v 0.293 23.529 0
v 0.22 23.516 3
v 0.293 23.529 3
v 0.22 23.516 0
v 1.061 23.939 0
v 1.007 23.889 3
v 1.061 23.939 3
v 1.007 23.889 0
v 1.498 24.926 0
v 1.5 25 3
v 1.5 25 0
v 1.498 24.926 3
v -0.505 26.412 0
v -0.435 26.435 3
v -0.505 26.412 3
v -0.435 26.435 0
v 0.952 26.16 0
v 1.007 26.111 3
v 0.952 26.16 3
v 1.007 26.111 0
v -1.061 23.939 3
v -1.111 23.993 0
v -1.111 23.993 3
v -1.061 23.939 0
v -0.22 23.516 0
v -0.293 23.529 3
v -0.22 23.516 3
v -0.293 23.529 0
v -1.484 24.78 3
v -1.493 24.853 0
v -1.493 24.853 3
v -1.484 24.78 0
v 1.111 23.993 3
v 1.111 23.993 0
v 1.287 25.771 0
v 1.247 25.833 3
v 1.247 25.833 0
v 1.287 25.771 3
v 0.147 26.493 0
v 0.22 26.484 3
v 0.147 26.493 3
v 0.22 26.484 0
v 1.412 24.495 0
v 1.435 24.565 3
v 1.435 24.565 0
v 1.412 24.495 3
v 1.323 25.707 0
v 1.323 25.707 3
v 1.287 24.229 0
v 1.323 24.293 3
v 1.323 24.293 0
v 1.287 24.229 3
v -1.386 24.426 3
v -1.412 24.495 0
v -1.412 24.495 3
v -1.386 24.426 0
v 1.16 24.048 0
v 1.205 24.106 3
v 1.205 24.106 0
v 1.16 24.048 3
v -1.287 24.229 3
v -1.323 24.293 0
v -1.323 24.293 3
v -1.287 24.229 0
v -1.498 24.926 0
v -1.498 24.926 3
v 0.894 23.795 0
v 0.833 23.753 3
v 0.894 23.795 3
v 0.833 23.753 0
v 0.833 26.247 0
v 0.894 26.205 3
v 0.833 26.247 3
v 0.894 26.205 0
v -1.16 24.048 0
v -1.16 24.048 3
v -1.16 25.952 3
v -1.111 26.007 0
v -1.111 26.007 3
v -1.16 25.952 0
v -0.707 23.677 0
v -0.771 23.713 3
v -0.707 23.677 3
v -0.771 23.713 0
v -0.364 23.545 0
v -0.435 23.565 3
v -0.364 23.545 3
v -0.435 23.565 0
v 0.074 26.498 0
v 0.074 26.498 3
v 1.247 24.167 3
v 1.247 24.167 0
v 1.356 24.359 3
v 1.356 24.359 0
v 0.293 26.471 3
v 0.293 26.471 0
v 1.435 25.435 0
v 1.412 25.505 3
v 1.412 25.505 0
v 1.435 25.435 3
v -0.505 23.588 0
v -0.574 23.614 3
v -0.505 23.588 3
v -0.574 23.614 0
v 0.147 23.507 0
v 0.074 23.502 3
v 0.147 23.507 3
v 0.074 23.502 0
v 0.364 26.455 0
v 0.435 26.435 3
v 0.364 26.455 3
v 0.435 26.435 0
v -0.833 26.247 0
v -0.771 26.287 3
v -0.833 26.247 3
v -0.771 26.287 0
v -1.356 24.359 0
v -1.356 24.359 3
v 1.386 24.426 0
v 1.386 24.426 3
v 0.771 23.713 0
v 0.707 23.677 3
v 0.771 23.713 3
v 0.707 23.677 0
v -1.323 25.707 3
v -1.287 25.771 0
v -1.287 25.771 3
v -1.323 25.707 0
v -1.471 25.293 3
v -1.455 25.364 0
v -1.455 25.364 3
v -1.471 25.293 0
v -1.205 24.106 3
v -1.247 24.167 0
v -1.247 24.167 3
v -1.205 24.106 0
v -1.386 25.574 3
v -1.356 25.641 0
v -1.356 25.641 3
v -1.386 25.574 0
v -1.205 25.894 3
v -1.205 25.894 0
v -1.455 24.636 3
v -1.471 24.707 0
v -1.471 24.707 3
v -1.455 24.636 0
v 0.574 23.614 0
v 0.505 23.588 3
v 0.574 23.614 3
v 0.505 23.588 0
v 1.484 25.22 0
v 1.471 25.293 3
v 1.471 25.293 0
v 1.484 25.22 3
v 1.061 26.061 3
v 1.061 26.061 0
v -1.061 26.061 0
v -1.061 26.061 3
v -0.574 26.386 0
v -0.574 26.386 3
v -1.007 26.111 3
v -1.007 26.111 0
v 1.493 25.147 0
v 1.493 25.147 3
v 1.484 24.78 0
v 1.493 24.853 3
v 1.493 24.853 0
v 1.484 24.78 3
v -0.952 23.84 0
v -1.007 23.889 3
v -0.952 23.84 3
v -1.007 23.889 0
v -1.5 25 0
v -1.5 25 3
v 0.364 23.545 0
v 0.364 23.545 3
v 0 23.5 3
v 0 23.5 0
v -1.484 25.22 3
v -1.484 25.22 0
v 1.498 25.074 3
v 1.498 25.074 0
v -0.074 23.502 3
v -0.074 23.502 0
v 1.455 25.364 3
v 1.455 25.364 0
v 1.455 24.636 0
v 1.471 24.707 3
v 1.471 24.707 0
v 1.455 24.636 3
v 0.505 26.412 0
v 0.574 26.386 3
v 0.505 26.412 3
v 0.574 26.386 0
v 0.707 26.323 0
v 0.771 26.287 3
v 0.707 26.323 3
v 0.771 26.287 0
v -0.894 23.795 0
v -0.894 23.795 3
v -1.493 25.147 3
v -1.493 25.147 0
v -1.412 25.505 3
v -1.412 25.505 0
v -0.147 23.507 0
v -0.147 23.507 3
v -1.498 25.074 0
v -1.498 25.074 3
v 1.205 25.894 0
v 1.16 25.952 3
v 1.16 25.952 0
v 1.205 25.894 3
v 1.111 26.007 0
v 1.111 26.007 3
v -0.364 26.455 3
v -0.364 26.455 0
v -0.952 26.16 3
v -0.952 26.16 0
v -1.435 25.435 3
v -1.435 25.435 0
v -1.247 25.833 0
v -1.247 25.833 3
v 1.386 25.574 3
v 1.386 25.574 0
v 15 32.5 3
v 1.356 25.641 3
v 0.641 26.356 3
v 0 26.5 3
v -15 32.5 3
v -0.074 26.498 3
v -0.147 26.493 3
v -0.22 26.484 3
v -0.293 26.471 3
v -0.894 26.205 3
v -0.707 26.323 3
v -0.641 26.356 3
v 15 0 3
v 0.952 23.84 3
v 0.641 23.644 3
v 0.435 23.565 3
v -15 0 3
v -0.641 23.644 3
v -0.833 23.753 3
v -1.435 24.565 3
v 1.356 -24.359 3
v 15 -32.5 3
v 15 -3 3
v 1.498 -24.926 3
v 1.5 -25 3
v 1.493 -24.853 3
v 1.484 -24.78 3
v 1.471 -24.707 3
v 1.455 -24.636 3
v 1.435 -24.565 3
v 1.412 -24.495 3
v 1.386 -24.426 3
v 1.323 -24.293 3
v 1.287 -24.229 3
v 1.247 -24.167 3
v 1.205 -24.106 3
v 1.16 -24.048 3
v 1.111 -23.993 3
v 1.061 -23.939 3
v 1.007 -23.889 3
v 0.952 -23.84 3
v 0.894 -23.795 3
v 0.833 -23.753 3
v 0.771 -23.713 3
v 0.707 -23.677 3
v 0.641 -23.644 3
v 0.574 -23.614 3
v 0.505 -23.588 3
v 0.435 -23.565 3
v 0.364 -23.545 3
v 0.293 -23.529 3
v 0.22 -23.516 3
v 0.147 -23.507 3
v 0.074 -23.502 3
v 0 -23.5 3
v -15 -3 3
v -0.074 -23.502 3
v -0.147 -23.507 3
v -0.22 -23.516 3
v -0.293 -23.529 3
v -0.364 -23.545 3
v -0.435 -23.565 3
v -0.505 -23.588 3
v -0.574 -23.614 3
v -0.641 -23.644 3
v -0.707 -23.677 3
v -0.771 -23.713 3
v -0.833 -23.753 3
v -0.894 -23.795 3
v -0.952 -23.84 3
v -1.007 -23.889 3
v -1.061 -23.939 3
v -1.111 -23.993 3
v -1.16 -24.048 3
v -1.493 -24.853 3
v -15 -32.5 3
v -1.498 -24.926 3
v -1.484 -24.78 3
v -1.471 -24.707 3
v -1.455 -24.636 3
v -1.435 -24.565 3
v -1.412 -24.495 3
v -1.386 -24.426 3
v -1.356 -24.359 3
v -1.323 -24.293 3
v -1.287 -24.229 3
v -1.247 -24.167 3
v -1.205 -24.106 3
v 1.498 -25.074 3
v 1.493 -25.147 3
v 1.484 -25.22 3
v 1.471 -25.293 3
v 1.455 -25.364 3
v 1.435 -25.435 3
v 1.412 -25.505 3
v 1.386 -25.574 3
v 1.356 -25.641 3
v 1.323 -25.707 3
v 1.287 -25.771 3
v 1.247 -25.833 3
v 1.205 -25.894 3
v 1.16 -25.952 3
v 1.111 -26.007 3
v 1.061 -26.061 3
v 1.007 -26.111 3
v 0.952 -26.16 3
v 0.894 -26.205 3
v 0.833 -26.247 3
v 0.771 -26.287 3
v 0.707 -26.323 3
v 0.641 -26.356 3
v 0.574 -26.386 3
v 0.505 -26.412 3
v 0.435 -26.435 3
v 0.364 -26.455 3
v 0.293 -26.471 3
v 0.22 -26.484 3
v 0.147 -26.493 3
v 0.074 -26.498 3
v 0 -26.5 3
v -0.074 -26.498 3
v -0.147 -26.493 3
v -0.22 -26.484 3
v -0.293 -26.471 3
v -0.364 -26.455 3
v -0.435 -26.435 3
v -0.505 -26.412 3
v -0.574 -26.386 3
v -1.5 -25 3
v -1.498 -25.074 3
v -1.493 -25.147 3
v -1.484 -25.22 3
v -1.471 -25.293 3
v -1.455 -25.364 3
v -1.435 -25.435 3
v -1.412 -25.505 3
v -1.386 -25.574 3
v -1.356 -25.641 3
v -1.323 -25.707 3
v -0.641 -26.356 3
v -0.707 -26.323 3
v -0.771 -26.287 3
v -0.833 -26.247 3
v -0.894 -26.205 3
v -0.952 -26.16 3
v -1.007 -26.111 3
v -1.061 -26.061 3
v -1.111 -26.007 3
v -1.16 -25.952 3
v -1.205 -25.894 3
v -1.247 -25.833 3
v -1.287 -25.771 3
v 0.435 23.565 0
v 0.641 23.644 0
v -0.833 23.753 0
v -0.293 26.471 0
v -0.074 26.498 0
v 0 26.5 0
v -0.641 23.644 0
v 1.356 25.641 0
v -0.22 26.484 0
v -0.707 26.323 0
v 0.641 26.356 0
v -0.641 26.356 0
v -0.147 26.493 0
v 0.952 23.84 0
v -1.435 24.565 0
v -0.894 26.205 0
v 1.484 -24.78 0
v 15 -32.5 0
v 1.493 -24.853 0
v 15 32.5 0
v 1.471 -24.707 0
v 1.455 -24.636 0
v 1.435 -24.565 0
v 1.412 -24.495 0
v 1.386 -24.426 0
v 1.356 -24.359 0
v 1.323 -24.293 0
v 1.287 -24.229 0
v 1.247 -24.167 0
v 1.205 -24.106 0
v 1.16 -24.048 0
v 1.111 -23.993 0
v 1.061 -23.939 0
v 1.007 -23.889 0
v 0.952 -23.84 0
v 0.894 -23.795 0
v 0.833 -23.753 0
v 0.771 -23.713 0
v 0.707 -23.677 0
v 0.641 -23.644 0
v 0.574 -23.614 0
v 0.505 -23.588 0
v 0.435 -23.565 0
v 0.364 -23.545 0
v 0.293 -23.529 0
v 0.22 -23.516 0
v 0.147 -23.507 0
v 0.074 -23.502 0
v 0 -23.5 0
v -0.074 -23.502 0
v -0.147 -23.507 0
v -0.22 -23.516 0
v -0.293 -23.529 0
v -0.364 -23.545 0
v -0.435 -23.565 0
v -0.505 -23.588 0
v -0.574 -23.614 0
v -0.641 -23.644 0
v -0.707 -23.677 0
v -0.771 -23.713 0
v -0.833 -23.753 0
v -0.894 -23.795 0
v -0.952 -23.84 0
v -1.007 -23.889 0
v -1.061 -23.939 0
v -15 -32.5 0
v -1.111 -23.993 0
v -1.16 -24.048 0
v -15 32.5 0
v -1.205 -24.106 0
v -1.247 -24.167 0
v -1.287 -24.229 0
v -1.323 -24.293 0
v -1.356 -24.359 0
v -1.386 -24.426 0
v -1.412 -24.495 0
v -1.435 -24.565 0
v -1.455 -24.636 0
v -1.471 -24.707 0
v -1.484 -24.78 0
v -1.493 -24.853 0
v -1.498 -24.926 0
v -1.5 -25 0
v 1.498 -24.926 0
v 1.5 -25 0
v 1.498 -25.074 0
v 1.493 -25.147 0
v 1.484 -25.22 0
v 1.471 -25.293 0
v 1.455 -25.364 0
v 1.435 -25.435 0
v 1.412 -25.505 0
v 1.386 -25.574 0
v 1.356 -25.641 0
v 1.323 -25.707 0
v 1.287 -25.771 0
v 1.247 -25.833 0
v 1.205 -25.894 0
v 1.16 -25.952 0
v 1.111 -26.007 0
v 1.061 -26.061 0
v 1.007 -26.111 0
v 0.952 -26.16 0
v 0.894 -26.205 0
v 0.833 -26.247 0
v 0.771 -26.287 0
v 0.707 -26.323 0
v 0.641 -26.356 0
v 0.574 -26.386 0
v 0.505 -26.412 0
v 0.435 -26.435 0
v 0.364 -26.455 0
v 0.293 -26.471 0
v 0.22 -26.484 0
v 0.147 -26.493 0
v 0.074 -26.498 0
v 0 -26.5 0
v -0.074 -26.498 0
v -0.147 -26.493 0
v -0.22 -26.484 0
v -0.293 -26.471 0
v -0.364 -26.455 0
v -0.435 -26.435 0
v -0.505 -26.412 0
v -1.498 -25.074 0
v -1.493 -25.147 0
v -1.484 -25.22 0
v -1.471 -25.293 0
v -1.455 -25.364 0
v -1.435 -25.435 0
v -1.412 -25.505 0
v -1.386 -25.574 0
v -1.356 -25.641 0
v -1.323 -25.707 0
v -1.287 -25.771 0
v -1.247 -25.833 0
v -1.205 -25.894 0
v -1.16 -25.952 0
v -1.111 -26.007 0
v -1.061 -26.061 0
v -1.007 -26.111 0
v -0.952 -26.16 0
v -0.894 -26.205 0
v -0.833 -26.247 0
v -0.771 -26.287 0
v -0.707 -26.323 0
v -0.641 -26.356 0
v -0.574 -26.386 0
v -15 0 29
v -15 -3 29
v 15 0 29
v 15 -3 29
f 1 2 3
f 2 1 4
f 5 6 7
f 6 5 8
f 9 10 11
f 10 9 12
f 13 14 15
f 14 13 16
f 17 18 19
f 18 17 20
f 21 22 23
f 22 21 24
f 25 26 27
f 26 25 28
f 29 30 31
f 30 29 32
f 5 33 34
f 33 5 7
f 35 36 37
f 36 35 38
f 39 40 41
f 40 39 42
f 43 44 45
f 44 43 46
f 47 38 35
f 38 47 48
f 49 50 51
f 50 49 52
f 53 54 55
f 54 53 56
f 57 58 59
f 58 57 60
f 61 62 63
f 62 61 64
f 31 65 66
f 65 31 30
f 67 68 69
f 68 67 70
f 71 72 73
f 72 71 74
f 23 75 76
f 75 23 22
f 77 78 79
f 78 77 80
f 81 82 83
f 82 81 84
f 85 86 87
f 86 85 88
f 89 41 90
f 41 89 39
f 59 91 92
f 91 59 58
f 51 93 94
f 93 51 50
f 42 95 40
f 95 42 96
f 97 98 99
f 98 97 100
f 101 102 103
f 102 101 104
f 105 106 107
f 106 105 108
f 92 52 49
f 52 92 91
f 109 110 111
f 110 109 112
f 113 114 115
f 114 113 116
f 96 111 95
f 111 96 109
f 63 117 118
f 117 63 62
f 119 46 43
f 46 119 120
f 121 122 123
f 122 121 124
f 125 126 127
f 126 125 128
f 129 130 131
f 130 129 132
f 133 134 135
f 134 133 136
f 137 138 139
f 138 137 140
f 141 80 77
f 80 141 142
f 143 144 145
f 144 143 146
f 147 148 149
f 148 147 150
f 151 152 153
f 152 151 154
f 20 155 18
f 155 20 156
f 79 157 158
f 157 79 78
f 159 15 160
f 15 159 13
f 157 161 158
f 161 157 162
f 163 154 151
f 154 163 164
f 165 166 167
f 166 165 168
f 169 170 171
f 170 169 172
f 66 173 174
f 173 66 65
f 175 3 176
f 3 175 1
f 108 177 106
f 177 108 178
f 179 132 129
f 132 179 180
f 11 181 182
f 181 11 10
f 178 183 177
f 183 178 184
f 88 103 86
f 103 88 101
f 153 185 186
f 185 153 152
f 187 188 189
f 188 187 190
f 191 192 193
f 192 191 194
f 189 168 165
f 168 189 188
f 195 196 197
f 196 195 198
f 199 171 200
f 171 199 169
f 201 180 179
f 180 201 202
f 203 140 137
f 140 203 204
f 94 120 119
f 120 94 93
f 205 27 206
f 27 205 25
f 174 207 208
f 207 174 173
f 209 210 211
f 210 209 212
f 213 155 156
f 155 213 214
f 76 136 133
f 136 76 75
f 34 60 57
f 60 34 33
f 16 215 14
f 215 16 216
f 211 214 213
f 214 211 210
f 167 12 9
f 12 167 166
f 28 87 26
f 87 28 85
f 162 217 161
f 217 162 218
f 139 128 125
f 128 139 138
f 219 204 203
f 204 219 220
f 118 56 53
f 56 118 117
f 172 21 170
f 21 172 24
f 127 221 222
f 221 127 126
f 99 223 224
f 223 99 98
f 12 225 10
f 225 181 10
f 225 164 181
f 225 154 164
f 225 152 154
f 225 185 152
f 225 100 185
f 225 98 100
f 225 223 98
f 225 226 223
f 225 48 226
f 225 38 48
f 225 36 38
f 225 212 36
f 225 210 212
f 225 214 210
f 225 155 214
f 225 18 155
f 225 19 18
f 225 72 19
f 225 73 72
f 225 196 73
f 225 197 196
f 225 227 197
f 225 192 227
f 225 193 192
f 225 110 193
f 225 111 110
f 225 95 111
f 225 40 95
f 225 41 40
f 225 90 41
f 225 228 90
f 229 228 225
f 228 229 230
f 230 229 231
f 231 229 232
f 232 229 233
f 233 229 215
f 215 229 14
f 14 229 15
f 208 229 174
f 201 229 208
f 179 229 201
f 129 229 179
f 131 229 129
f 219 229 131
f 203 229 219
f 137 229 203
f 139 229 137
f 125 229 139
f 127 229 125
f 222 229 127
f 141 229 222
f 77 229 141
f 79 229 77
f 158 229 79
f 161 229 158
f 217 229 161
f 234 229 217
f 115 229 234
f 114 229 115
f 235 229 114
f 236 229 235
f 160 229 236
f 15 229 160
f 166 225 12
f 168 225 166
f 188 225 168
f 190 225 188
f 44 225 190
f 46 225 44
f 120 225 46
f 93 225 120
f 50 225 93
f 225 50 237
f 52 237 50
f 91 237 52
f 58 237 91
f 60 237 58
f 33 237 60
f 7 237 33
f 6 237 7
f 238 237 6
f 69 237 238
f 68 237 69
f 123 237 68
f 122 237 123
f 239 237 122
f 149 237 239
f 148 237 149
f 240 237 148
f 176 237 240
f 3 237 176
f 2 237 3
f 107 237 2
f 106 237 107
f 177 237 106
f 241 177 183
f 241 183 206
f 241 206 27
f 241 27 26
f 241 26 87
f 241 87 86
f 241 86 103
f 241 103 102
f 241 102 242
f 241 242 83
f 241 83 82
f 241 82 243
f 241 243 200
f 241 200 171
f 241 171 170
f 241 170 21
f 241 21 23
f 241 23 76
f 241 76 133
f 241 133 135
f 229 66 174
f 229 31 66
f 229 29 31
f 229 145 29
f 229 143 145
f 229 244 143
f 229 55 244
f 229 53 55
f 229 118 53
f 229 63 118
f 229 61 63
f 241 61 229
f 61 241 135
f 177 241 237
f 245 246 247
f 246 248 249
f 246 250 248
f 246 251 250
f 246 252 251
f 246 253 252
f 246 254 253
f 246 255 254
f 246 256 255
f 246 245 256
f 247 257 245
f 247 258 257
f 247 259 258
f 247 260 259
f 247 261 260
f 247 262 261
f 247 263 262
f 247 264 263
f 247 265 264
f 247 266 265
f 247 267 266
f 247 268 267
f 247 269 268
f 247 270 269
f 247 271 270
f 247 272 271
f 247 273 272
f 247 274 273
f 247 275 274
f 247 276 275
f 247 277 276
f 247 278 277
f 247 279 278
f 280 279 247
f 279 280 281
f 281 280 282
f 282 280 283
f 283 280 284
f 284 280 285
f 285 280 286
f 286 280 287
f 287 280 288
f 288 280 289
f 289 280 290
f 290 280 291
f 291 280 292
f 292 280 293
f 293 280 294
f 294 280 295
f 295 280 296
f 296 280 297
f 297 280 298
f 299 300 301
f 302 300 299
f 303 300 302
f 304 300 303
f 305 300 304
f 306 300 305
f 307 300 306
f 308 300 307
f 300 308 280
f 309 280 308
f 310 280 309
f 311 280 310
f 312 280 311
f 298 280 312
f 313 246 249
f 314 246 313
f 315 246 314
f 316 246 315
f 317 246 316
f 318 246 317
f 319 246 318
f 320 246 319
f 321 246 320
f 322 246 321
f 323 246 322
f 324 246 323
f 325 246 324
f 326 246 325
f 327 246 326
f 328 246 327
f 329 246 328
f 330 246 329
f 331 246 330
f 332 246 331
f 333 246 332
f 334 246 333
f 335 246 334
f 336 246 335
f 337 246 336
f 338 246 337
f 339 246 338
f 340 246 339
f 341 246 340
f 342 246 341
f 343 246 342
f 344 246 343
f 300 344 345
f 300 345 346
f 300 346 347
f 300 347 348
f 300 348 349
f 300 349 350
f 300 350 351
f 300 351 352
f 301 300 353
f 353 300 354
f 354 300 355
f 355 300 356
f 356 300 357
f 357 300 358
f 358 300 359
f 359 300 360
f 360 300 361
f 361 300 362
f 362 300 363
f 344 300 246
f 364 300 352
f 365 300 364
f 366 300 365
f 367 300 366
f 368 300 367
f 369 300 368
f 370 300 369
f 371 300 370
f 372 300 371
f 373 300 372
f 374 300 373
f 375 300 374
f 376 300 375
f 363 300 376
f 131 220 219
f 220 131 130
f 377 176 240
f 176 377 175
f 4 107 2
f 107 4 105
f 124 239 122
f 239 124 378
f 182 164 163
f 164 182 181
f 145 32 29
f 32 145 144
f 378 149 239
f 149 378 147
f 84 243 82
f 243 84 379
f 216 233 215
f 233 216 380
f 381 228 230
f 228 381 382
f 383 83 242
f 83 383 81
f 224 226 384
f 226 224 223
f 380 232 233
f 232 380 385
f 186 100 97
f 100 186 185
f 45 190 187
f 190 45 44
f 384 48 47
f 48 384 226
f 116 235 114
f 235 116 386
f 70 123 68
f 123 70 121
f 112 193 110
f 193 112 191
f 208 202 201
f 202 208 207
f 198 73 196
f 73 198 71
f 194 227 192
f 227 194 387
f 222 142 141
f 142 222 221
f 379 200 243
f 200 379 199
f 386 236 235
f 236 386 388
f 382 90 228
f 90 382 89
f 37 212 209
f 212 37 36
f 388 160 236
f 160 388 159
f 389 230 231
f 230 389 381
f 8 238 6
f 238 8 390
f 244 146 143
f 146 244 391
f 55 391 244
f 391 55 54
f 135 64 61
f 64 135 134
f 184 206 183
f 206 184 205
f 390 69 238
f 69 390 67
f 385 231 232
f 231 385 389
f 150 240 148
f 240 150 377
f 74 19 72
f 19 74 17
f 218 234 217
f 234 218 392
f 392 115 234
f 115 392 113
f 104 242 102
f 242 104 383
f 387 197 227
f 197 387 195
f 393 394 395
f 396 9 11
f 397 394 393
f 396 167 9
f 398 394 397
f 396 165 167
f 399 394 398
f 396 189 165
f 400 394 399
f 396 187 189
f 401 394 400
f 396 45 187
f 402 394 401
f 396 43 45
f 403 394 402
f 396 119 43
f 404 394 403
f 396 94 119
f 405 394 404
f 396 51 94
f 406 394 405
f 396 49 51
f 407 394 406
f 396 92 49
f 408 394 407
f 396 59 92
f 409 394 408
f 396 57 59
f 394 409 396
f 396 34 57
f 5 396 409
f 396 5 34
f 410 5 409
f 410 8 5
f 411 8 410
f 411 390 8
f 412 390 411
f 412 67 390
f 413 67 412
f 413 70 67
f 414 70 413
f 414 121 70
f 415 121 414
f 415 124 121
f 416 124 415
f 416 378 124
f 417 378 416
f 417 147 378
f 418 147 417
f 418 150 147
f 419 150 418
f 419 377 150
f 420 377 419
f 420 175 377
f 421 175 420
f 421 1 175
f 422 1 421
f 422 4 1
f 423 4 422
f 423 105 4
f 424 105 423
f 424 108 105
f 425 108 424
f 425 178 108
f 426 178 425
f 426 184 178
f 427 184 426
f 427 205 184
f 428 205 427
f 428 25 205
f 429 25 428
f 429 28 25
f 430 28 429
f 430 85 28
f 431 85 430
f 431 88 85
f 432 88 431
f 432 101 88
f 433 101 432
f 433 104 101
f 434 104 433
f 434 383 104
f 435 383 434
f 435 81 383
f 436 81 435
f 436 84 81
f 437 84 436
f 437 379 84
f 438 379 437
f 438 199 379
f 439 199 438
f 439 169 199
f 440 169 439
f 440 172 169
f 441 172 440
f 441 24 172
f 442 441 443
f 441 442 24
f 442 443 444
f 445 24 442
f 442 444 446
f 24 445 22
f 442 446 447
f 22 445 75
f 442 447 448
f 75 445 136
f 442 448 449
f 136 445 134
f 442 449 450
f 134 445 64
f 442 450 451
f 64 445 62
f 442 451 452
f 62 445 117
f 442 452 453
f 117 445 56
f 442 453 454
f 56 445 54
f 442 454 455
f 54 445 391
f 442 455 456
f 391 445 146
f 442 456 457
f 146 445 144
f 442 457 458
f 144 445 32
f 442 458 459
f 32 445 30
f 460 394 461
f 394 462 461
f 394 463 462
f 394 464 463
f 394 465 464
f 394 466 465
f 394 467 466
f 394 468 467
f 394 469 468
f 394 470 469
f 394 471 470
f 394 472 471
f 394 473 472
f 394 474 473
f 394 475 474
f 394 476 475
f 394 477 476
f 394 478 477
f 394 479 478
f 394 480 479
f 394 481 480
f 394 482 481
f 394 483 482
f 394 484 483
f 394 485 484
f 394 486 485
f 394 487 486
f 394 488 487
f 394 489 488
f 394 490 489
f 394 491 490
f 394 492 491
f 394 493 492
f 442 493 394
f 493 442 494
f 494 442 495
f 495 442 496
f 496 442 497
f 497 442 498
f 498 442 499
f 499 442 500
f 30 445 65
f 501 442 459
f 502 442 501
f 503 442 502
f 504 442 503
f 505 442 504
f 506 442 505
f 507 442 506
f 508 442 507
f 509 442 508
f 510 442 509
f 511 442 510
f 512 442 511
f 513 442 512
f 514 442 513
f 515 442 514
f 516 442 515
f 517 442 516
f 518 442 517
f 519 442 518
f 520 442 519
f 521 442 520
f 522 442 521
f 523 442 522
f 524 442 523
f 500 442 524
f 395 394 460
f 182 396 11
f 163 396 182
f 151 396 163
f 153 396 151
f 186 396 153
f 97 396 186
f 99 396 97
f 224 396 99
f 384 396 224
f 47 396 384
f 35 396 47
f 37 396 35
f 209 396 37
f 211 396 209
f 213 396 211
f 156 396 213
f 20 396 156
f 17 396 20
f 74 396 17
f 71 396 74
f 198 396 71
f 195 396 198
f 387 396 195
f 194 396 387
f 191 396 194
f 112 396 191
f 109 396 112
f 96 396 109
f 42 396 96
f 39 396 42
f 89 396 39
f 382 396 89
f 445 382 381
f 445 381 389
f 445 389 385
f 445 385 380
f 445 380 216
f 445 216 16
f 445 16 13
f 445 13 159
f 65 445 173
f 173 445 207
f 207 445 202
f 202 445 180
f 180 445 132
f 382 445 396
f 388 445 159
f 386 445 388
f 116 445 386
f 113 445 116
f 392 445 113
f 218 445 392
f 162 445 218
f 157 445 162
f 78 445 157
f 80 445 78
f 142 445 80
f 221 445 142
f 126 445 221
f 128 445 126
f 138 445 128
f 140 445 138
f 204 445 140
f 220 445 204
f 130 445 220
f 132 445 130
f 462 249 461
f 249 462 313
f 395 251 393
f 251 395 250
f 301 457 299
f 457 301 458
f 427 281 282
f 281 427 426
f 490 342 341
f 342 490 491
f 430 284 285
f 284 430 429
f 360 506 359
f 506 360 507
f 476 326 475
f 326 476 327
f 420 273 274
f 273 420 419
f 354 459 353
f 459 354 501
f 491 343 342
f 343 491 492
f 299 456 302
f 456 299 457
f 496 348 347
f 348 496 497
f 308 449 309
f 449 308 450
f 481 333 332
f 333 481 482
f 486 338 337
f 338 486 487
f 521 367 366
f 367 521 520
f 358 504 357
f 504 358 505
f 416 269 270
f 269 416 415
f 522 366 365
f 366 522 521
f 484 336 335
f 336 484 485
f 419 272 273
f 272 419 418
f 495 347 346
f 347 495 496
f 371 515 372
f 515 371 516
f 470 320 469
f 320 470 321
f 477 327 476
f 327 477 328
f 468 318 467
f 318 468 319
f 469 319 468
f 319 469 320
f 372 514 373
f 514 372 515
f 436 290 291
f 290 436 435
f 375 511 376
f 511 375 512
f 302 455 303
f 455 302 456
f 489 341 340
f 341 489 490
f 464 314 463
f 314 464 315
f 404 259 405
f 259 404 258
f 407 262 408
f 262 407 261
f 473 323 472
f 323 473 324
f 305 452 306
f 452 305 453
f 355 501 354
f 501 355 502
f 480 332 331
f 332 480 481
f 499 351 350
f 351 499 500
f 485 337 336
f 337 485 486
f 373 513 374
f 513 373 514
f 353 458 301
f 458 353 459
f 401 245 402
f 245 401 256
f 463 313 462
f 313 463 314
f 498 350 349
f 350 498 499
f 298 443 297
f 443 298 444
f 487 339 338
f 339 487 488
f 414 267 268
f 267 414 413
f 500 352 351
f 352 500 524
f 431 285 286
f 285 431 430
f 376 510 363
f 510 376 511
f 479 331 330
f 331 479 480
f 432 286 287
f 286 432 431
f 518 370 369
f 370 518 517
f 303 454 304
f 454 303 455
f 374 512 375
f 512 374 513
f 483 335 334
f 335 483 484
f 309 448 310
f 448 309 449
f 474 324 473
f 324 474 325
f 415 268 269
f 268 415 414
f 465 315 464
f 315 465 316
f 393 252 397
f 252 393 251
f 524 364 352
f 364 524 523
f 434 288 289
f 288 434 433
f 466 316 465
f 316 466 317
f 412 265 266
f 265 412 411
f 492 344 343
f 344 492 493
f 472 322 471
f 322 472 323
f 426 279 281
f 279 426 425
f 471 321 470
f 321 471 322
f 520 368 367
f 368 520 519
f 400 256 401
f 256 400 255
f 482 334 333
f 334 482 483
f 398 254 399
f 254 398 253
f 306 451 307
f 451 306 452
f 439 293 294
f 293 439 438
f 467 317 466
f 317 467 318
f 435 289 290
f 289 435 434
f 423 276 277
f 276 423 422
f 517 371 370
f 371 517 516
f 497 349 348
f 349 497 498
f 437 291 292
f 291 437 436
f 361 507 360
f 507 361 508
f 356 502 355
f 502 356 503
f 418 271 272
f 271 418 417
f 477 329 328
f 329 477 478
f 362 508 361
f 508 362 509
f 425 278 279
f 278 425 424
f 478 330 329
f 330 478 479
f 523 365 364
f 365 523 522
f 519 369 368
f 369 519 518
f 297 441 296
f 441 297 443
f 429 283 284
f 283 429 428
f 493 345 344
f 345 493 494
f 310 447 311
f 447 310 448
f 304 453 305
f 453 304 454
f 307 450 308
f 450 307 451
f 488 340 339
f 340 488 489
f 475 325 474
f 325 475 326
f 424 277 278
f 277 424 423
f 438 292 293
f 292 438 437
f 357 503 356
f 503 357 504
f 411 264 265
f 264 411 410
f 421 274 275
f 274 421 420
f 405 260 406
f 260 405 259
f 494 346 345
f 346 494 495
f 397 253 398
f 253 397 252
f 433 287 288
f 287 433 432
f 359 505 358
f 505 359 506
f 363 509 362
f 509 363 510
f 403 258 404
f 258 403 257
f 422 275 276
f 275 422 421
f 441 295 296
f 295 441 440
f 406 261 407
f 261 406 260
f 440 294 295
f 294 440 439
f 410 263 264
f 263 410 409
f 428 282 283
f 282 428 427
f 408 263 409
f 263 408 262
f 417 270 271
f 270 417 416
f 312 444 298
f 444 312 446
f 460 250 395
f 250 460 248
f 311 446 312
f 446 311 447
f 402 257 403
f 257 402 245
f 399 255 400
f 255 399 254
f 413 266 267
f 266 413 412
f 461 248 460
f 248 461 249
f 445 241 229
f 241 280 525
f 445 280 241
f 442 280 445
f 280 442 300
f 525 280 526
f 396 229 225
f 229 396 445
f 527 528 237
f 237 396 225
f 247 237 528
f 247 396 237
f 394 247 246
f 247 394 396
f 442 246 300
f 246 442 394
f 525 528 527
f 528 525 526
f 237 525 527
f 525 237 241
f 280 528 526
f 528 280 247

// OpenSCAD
// file: parameters.scad
include <Round-Anything/polyround.scad>

$fn = 128;

side_thickness = 3.0;

base_surround_x = 7;
base_surround_y = 7;
base_thickness = 3.5;

lip_thickness = 3;
lip_height = 4;

pi_mount_x = 58;
pi_mount_y = 49;

pi_0_mount_x = pi_mount_x;
pi_0_mount_y = 23;

pi_board_x = 65;
pi_board_y = 56.5;

pi_0_board_x = 65;
pi_0_board_y = 30;
pi_0_sd_offset = 12.5;


pump_width = 56;
pump_depth = 40;

pump_distance = 49;
pump_hole = 30;

length = 3*pump_width + 2*base_surround_x;
width = pump_depth + 35;;


lip_outer_x = length - side_thickness;
lip_outer_y = width - side_thickness;

lip_inner_x = lip_outer_x - lip_thickness;
lip_inner_y = lip_outer_y - lip_thickness;

lid_height = 55.0;

connector_width = 10.5;

clip_bottom_width = 2;
clip_top_width = 0.75;
clip_length = 5;

notch_length = 10;
notch_height = 1.5;

lower_mount_offset = 50;
lower_mount_spacing = 50;

base_polygon = [
    
    [-length/2, width/2, 3],
    [length/2, width/2, 3],
    [length/2, -width/2, 3],
    [-length/2, -width/2, 3]   
];


lip_outer_polygon = [
    [-lip_outer_x/2, lip_outer_y/2, 3],
    [lip_outer_x/2, lip_outer_y/2, 3],
    [lip_outer_x/2, -lip_outer_y/2, 3],
    [-lip_outer_x/2, -lip_outer_y/2, 3]
];

lip_inner_polygon = [
    [-lip_inner_x/2, lip_inner_y/2, 3],
    [lip_inner_x/2, lip_inner_y/2, 3],
    [lip_inner_x/2, -lip_inner_y/2, 3],
    [-lip_inner_x/2, -lip_inner_y/2, 3]
];


module notches() {
    union() {
        translate([length/2,0,0])
            linear_extrude(notch_height)
                square([lip_thickness,notch_length], true);
        translate([-length/2,0,0])
            linear_extrude(notch_height)
                square([lip_thickness, notch_length], true);    
    }
}



module lip() {
    union() {
        linear_extrude(lip_height) {
            difference() {
                polygon(polyRound(lip_outer_polygon, 256));
                polygon(polyRound(lip_inner_polygon, 256));
            }
         }
    }
}
// main file
include <parameters.scad>

bracket_thickness = 3;

bracket_width = 65;
bracket_length = 30;
flange_width = 26;

bracket();
translate([0,0,bracket_thickness + flange_width/2])
    rotate([90,0,0])
        flange();


module bracket() {
    difference() {
        linear_extrude(bracket_thickness)
            square([bracket_length, bracket_width], true);
       
        union() {
            translate([0, lower_mount_offset/2, 0])
                linear_extrude(bracket_thickness)
                    circle(d=3);
            translate([0, -lower_mount_offset/2, 0])
                linear_extrude(bracket_thickness)
                    circle(d=3);
        }
    }
}

module flange() {
    linear_extrude(bracket_thickness) 
        square([bracket_length, flange_width], true);

}
